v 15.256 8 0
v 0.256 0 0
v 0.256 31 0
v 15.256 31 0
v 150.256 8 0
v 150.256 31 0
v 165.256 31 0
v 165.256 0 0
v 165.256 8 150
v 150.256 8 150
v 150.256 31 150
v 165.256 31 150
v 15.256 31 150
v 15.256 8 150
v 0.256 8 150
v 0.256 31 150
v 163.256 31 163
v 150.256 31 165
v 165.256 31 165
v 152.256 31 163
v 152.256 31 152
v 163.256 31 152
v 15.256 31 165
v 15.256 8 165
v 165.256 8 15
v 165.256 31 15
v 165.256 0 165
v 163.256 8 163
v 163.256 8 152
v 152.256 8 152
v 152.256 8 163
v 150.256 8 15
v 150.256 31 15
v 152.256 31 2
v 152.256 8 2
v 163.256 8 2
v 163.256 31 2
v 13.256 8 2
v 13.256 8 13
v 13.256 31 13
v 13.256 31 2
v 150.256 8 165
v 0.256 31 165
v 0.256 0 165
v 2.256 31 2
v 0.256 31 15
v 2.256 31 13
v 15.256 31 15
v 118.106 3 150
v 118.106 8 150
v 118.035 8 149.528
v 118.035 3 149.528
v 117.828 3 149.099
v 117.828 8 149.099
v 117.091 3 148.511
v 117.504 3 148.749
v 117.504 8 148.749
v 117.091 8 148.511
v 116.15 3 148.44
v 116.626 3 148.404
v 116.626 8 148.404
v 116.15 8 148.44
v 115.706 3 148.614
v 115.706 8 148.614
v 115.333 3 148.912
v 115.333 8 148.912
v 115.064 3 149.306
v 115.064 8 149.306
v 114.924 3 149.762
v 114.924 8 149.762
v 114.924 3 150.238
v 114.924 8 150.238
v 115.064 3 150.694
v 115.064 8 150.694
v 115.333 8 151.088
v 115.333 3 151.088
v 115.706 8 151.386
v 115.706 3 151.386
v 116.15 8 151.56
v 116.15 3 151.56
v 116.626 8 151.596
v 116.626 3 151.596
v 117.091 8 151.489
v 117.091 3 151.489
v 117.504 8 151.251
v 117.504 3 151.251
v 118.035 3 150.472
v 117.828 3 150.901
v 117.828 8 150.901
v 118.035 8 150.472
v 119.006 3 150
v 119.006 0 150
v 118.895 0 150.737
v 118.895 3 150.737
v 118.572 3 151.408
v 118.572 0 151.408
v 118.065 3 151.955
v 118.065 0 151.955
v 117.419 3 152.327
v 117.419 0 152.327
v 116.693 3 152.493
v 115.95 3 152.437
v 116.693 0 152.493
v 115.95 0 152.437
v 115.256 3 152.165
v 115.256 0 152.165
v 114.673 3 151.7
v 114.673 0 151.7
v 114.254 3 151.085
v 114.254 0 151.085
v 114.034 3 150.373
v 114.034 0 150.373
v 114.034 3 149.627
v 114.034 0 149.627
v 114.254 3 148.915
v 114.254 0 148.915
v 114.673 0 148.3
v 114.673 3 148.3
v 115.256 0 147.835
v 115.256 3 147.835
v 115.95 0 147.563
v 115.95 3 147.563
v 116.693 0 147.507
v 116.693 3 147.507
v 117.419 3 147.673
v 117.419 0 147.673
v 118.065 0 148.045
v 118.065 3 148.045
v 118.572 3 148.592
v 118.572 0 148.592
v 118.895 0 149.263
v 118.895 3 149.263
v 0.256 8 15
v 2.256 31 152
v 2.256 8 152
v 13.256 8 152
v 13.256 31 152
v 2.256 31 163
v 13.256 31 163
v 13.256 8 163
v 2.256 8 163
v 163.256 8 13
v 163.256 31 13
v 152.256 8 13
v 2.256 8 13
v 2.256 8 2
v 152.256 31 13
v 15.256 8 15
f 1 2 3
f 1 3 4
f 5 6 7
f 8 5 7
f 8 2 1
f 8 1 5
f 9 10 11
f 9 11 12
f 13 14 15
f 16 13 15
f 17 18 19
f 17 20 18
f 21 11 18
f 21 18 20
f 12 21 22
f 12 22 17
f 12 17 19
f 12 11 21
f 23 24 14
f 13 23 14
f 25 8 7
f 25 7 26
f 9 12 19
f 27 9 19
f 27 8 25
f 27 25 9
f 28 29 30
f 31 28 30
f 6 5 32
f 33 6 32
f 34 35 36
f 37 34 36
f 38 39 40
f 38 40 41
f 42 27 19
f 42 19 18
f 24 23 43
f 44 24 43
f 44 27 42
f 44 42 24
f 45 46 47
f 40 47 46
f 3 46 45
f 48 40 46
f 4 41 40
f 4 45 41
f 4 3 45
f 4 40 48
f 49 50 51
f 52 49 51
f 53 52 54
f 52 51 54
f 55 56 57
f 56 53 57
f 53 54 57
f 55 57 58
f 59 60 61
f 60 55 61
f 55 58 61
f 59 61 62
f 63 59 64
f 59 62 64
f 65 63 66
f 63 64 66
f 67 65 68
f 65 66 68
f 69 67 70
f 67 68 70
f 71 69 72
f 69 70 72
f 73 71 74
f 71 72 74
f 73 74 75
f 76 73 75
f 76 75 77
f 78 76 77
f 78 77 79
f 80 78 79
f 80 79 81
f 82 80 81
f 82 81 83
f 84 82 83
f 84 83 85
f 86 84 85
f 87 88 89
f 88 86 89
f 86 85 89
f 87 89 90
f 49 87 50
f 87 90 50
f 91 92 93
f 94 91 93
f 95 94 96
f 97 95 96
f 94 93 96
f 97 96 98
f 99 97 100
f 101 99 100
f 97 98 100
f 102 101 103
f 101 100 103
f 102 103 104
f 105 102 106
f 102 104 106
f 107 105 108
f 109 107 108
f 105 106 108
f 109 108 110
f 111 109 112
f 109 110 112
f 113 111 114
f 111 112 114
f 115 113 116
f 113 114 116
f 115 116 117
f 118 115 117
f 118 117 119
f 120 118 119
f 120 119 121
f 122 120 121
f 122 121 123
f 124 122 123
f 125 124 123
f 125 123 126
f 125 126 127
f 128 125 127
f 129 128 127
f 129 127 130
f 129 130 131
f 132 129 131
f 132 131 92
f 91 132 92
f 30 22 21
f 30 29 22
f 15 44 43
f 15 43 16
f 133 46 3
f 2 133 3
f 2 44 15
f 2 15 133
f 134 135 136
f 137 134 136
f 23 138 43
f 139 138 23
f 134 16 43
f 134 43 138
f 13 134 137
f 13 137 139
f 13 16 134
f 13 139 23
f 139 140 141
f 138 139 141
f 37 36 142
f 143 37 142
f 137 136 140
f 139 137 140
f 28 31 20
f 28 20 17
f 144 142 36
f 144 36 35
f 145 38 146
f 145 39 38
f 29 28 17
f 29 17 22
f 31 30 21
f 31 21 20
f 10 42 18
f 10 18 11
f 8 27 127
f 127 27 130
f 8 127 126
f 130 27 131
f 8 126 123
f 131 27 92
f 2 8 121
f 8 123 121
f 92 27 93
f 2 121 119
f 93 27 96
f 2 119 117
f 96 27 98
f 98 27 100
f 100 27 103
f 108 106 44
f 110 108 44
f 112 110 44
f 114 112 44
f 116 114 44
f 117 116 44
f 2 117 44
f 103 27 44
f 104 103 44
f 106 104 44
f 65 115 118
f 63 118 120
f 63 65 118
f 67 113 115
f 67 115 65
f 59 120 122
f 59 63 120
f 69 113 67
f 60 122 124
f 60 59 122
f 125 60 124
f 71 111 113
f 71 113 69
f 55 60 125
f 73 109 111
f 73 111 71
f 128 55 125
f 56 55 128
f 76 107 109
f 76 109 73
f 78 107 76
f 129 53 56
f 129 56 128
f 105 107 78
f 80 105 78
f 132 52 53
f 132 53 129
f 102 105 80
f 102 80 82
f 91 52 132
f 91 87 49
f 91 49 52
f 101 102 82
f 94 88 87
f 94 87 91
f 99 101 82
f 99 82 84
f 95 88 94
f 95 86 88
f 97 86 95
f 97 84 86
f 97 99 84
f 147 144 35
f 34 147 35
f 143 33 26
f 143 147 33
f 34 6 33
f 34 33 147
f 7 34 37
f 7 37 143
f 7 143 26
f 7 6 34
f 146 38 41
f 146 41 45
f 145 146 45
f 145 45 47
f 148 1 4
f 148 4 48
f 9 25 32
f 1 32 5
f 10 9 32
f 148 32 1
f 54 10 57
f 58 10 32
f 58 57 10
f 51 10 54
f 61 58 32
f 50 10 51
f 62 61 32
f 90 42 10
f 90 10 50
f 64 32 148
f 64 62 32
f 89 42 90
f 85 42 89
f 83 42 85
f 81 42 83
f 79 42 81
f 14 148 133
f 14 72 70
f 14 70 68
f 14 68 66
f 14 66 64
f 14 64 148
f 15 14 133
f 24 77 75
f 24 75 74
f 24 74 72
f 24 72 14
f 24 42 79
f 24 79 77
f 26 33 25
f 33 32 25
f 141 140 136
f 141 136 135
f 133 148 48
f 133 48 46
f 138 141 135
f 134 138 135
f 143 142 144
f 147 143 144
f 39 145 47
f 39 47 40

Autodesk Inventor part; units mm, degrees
ref_plane "YZ Plane" through (0, 0, 0) normal (1, 0, 0) x (0, 1, 0)
ref_plane "XZ Plane" through (0, 0, 0) normal (0, 1, 0) x (-1, 0, 0)
ref_plane "XY Plane" through (0, 0, 0) normal (0, 0, 1) x (1, 0, 0)
sketch "Sketch1" plane through (0, 0, 0) normal (0, 1, 0) x (-1, 0, 0)
  line L0 (-0.256, 0) -> (-165.256, 0)
  line L1 (-165.256, 0) -> (-165.256, 165)
  line L2 (-165.256, 165) -> (-0.256, 165)
  line L3 (-0.256, 165) -> (-0.256, 0)
  point P0 (0, 0)
  dimension "d0" = 165
  dimension "d1" = 165
extrude "Extrusion1" add sketch "Sketch1" along normal blind 8
sketch "Sketch2" plane through (0, 8, 0) normal (0, 1, 0) x (1, 0, 0)
  line L0 (165.256, 0) -> (0.256, 0) projected
  line L1 (0.256, 0) -> (15.256, 0)
  line L2 (15.256, 0) -> (15.256, -15)
  line L3 (15.256, -15) -> (0.256, -15)
  line L4 (0.256, -15) -> (0.256, 0)
  line L5 (0.256, -165) -> (165.256, -165) projected
  line L6 (0.256, -165) -> (15.256, -165)
  line L7 (15.256, -165) -> (15.256, -150)
  line L8 (15.256, -150) -> (0.256, -150)
  line L9 (0.256, -150) -> (0.256, -165)
  line L10 (2.256, -152) -> (13.256, -152)
  line L11 (13.256, -152) -> (13.256, -163)
  line L12 (13.256, -163) -> (2.256, -163)
  line L13 (2.256, -163) -> (2.256, -152)
  line L14 (13.256, -13) -> (13.256, -2)
  line L15 (13.256, -2) -> (2.256, -2)
  line L16 (2.256, -2) -> (2.256, -13)
  line L17 (2.256, -13) -> (13.256, -13)
  line L18 (82.756, 0) -> (82.756, -165)
  line L19 (0.256, 0) -> (165.256, 0)
  line L20 (150.256, 0) -> (150.256, -15)
  line L21 (150.256, -15) -> (165.256, -15)
  line L22 (165.256, -15) -> (165.256, 0)
  line L23 (165.256, -165) -> (0.256, -165)
  line L24 (165.256, -165) -> (150.256, -165)
  line L25 (150.256, -165) -> (150.256, -150)
  line L26 (150.256, -150) -> (165.256, -150)
  line L27 (165.256, -150) -> (165.256, -165)
  line L28 (163.256, -152) -> (152.256, -152)
  line L29 (152.256, -152) -> (152.256, -163)
  line L30 (152.256, -163) -> (163.256, -163)
  line L31 (163.256, -163) -> (163.256, -152)
  line L32 (152.256, -13) -> (152.256, -2)
  line L33 (152.256, -2) -> (163.256, -2)
  line L34 (163.256, -2) -> (163.256, -13)
  line L35 (163.256, -13) -> (152.256, -13)
  point P0 (0, 0)
  dimension "d4" = 15
  dimension "d5" = 15
  dimension "d6" = 15
  dimension "d7" = 15
  dimension "d8" = 2
  dimension "d9" = 2
extrude "Extrusion2" add sketch "Sketch2" along normal blind 23
sketch "Sketch3" plane through (0, 8, 0) normal (0, 1, 0) x (1, 0, 0)
  line L0 (150.256, -150) -> (150.256, -165) projected
  line L1 (0.256, -150) -> (15.256, -150) projected
  line L2 (150.256, -150) -> (15.256, -150)
  line L3 (0.256, -165) -> (165.256, -165) projected
  line L4 (82.756, -165) -> (82.756, -150)
  line L5 (82.756, -150) -> (150.256, -150)
  circle A0 centre (116.506, -150) radius 1.6
  point P0 (0, 0)
  dimension "d12" = 3.2
extrude "Extrusion3" cut sketch "Sketch3" against normal blind 8 contours A0 L2 | L2 A0
sketch "Sketch4" plane through (0, 0, 0) normal (0, -1, 0) x (1, 0, 0)
  circle A0 centre (116.506, 150) radius 1.6 projected
  circle A1 centre (116.506, 150) radius 2.5
  point P0 (0, 0)
  dimension "d15" = 5
extrude "Extrusion4" cut sketch "Sketch4" against normal blind 3
properties part number "piano inferiore"
